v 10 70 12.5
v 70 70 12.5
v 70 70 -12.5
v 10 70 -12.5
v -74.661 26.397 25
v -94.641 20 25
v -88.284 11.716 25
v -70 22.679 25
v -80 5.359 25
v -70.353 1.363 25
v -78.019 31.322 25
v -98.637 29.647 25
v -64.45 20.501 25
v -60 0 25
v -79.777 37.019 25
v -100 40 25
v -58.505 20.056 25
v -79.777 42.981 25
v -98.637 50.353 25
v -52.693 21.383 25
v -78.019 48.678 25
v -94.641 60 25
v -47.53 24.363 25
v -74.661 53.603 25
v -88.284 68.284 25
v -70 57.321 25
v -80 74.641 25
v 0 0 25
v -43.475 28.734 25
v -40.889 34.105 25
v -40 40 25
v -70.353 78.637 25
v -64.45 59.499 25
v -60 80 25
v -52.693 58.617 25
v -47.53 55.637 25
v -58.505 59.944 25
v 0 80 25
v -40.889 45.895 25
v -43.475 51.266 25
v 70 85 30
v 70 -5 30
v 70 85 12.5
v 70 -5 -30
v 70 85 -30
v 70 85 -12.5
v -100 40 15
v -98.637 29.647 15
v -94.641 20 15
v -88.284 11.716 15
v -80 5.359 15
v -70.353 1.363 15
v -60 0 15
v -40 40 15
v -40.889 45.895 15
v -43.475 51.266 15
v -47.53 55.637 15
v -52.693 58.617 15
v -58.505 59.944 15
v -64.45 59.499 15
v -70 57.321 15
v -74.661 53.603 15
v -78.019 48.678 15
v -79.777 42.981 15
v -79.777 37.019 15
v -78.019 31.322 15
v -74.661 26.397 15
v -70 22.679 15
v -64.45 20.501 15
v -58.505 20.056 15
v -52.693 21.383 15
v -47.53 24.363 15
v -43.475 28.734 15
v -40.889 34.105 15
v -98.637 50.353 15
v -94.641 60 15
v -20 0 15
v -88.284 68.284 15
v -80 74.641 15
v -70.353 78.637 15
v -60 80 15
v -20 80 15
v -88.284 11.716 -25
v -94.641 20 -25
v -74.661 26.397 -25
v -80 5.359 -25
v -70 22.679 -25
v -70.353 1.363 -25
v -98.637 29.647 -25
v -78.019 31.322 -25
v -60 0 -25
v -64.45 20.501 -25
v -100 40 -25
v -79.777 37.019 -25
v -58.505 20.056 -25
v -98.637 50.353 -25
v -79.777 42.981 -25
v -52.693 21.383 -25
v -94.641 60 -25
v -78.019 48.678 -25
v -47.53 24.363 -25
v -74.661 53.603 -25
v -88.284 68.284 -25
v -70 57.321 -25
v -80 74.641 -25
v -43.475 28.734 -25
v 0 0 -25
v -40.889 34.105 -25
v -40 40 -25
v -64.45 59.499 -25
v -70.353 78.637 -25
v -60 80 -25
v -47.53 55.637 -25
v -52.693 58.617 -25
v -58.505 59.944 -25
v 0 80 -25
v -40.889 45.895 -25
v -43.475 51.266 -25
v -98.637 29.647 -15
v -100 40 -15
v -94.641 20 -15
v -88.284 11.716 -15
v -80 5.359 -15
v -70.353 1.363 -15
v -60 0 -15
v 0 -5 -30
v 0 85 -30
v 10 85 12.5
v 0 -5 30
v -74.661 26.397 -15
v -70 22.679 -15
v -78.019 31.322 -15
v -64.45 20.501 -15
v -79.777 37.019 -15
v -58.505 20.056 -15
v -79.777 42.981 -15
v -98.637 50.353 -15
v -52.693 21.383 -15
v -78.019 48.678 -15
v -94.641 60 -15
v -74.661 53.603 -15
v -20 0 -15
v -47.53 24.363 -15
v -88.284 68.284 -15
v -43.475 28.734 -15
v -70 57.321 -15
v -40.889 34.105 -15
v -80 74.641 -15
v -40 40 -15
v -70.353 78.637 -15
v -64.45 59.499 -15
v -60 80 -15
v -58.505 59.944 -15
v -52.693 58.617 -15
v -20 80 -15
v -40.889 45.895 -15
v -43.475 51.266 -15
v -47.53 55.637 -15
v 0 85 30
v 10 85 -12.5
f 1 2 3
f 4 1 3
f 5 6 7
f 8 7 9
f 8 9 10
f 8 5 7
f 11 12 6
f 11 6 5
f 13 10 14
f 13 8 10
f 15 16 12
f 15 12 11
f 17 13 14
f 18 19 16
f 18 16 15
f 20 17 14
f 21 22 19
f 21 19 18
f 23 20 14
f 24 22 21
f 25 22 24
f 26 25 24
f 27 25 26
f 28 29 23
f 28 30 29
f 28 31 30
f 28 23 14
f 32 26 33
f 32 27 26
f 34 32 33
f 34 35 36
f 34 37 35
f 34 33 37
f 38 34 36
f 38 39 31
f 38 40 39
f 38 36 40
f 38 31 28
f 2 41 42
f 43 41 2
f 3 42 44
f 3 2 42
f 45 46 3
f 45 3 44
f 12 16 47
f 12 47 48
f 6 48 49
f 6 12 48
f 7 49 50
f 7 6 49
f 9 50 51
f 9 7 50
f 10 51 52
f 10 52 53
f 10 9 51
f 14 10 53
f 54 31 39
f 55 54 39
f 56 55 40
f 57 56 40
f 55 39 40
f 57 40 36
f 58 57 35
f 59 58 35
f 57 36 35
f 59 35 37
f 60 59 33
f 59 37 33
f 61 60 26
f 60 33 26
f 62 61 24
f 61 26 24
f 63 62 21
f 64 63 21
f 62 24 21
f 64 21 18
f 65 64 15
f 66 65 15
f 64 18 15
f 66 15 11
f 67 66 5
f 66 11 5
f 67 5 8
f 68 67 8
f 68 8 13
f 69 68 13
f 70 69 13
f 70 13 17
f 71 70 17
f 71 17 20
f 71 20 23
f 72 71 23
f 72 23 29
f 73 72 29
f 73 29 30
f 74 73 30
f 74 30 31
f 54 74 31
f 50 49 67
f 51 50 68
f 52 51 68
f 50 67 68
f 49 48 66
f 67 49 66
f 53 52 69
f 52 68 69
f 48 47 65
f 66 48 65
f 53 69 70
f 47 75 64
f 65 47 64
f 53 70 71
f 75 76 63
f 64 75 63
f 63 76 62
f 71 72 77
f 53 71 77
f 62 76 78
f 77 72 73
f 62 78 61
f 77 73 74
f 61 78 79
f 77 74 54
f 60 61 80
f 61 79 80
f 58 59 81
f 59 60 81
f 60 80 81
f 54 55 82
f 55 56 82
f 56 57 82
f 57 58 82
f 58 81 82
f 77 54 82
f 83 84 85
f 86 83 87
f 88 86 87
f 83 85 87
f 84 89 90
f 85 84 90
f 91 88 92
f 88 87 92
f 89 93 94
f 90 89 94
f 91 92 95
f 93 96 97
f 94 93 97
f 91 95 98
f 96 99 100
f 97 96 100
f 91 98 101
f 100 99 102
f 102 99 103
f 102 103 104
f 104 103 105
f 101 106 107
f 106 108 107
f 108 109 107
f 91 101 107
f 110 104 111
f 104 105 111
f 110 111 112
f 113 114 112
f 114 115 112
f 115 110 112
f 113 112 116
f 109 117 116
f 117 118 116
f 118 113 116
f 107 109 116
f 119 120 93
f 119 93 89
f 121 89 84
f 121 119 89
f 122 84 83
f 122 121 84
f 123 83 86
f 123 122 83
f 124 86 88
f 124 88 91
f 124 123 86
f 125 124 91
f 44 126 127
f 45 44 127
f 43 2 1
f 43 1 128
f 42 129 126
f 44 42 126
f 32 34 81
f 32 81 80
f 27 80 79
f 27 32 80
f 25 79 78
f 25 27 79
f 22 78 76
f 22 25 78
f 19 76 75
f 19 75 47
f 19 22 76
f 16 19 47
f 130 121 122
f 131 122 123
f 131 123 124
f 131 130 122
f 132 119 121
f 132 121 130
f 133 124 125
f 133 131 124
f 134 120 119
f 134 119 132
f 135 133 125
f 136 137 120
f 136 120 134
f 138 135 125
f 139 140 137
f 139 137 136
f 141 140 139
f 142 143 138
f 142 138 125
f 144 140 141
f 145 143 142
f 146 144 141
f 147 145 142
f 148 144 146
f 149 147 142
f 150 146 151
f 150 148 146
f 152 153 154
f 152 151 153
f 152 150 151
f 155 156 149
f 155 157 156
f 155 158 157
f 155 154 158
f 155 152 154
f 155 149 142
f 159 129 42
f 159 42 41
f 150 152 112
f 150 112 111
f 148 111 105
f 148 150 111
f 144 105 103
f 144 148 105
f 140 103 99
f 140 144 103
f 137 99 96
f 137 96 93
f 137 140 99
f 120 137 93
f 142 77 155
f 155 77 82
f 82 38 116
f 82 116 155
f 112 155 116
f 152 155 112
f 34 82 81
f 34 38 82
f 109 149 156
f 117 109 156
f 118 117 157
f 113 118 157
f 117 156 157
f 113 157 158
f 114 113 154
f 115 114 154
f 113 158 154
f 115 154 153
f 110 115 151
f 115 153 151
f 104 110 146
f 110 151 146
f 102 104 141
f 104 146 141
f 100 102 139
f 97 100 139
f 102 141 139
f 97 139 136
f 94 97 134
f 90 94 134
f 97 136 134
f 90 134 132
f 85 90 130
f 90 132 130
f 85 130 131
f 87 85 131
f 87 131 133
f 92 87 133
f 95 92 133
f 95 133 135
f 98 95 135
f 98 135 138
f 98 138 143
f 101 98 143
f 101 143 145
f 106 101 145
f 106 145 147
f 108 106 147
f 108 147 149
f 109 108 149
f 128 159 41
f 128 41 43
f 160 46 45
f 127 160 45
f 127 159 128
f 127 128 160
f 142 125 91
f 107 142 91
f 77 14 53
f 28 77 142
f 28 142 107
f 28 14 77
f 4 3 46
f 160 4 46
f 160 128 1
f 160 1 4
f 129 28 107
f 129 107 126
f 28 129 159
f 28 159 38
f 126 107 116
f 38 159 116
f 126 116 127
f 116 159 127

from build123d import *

# Parameters (mm, degrees)
BOSS_EXTRUDE1_DEPTH = 25
SKETCH2_R           = 20
CUT_EXTRUDE1_DEPTH  = 51
SKETCH3_W           = 80
SKETCH3_H           = 80
CUT_EXTRUDE2_DEPTH  = 15
SKETCH4_W           = 60
SKETCH4_H           = 90
BOSS_EXTRUDE2_DEPTH = 70
SKETCH5_W           = 25
SKETCH5_H           = 15
CUT_EXTRUDE3_DEPTH  = 60


with BuildPart() as part:
    # Sketch1 → Boss-Extrude1 (new body, symmetric)
    with BuildSketch(Plane.XY):
        with BuildLine():
            Line((-60, 0), (0, 0))
            Line((0, 0), (0, 80))
            Line((0, 80), (-60, 80))
            ThreePointArc((-60, 80), (-88.284271217, 68.284271278), (-100, 40.000000086))
            ThreePointArc((-100, 40.000000086), (-88.284271278, 11.715728783), (-60, 0))
        make_face()
    extrude(amount=BOSS_EXTRUDE1_DEPTH, both=True)

    # Sketch2 → Cut-Extrude1 (cut, through all)
    with BuildSketch(Plane.XY.offset(25)):
        with Locations((-60, 40)):
            Circle(SKETCH2_R)
    extrude(amount=-CUT_EXTRUDE1_DEPTH, mode=Mode.SUBTRACT)

    # Sketch3 → Cut-Extrude2 (cut, symmetric)
    with BuildSketch(Plane.XY):
        with Locations((-60, 40)):
            Rectangle(SKETCH3_W, SKETCH3_H)
    extrude(amount=CUT_EXTRUDE2_DEPTH, both=True, mode=Mode.SUBTRACT)

    # Sketch4 → Boss-Extrude2 (add)
    with BuildSketch(Plane(origin=(0, 0, 0), x_dir=(0, 0, -1), z_dir=(1, 0, 0))):
        with Locations((0, 40)):
            Rectangle(SKETCH4_W, SKETCH4_H)
    extrude(amount=BOSS_EXTRUDE2_DEPTH)

    # Sketch5 → Cut-Extrude3 (cut)
    with BuildSketch(Plane(origin=(70, 0, 0), x_dir=(0, 0, -1), z_dir=(1, 0, 0))):
        with Locations((0, 77.5)):
            Rectangle(SKETCH5_W, SKETCH5_H)
    extrude(amount=-CUT_EXTRUDE3_DEPTH, mode=Mode.SUBTRACT)


solid = part.part
